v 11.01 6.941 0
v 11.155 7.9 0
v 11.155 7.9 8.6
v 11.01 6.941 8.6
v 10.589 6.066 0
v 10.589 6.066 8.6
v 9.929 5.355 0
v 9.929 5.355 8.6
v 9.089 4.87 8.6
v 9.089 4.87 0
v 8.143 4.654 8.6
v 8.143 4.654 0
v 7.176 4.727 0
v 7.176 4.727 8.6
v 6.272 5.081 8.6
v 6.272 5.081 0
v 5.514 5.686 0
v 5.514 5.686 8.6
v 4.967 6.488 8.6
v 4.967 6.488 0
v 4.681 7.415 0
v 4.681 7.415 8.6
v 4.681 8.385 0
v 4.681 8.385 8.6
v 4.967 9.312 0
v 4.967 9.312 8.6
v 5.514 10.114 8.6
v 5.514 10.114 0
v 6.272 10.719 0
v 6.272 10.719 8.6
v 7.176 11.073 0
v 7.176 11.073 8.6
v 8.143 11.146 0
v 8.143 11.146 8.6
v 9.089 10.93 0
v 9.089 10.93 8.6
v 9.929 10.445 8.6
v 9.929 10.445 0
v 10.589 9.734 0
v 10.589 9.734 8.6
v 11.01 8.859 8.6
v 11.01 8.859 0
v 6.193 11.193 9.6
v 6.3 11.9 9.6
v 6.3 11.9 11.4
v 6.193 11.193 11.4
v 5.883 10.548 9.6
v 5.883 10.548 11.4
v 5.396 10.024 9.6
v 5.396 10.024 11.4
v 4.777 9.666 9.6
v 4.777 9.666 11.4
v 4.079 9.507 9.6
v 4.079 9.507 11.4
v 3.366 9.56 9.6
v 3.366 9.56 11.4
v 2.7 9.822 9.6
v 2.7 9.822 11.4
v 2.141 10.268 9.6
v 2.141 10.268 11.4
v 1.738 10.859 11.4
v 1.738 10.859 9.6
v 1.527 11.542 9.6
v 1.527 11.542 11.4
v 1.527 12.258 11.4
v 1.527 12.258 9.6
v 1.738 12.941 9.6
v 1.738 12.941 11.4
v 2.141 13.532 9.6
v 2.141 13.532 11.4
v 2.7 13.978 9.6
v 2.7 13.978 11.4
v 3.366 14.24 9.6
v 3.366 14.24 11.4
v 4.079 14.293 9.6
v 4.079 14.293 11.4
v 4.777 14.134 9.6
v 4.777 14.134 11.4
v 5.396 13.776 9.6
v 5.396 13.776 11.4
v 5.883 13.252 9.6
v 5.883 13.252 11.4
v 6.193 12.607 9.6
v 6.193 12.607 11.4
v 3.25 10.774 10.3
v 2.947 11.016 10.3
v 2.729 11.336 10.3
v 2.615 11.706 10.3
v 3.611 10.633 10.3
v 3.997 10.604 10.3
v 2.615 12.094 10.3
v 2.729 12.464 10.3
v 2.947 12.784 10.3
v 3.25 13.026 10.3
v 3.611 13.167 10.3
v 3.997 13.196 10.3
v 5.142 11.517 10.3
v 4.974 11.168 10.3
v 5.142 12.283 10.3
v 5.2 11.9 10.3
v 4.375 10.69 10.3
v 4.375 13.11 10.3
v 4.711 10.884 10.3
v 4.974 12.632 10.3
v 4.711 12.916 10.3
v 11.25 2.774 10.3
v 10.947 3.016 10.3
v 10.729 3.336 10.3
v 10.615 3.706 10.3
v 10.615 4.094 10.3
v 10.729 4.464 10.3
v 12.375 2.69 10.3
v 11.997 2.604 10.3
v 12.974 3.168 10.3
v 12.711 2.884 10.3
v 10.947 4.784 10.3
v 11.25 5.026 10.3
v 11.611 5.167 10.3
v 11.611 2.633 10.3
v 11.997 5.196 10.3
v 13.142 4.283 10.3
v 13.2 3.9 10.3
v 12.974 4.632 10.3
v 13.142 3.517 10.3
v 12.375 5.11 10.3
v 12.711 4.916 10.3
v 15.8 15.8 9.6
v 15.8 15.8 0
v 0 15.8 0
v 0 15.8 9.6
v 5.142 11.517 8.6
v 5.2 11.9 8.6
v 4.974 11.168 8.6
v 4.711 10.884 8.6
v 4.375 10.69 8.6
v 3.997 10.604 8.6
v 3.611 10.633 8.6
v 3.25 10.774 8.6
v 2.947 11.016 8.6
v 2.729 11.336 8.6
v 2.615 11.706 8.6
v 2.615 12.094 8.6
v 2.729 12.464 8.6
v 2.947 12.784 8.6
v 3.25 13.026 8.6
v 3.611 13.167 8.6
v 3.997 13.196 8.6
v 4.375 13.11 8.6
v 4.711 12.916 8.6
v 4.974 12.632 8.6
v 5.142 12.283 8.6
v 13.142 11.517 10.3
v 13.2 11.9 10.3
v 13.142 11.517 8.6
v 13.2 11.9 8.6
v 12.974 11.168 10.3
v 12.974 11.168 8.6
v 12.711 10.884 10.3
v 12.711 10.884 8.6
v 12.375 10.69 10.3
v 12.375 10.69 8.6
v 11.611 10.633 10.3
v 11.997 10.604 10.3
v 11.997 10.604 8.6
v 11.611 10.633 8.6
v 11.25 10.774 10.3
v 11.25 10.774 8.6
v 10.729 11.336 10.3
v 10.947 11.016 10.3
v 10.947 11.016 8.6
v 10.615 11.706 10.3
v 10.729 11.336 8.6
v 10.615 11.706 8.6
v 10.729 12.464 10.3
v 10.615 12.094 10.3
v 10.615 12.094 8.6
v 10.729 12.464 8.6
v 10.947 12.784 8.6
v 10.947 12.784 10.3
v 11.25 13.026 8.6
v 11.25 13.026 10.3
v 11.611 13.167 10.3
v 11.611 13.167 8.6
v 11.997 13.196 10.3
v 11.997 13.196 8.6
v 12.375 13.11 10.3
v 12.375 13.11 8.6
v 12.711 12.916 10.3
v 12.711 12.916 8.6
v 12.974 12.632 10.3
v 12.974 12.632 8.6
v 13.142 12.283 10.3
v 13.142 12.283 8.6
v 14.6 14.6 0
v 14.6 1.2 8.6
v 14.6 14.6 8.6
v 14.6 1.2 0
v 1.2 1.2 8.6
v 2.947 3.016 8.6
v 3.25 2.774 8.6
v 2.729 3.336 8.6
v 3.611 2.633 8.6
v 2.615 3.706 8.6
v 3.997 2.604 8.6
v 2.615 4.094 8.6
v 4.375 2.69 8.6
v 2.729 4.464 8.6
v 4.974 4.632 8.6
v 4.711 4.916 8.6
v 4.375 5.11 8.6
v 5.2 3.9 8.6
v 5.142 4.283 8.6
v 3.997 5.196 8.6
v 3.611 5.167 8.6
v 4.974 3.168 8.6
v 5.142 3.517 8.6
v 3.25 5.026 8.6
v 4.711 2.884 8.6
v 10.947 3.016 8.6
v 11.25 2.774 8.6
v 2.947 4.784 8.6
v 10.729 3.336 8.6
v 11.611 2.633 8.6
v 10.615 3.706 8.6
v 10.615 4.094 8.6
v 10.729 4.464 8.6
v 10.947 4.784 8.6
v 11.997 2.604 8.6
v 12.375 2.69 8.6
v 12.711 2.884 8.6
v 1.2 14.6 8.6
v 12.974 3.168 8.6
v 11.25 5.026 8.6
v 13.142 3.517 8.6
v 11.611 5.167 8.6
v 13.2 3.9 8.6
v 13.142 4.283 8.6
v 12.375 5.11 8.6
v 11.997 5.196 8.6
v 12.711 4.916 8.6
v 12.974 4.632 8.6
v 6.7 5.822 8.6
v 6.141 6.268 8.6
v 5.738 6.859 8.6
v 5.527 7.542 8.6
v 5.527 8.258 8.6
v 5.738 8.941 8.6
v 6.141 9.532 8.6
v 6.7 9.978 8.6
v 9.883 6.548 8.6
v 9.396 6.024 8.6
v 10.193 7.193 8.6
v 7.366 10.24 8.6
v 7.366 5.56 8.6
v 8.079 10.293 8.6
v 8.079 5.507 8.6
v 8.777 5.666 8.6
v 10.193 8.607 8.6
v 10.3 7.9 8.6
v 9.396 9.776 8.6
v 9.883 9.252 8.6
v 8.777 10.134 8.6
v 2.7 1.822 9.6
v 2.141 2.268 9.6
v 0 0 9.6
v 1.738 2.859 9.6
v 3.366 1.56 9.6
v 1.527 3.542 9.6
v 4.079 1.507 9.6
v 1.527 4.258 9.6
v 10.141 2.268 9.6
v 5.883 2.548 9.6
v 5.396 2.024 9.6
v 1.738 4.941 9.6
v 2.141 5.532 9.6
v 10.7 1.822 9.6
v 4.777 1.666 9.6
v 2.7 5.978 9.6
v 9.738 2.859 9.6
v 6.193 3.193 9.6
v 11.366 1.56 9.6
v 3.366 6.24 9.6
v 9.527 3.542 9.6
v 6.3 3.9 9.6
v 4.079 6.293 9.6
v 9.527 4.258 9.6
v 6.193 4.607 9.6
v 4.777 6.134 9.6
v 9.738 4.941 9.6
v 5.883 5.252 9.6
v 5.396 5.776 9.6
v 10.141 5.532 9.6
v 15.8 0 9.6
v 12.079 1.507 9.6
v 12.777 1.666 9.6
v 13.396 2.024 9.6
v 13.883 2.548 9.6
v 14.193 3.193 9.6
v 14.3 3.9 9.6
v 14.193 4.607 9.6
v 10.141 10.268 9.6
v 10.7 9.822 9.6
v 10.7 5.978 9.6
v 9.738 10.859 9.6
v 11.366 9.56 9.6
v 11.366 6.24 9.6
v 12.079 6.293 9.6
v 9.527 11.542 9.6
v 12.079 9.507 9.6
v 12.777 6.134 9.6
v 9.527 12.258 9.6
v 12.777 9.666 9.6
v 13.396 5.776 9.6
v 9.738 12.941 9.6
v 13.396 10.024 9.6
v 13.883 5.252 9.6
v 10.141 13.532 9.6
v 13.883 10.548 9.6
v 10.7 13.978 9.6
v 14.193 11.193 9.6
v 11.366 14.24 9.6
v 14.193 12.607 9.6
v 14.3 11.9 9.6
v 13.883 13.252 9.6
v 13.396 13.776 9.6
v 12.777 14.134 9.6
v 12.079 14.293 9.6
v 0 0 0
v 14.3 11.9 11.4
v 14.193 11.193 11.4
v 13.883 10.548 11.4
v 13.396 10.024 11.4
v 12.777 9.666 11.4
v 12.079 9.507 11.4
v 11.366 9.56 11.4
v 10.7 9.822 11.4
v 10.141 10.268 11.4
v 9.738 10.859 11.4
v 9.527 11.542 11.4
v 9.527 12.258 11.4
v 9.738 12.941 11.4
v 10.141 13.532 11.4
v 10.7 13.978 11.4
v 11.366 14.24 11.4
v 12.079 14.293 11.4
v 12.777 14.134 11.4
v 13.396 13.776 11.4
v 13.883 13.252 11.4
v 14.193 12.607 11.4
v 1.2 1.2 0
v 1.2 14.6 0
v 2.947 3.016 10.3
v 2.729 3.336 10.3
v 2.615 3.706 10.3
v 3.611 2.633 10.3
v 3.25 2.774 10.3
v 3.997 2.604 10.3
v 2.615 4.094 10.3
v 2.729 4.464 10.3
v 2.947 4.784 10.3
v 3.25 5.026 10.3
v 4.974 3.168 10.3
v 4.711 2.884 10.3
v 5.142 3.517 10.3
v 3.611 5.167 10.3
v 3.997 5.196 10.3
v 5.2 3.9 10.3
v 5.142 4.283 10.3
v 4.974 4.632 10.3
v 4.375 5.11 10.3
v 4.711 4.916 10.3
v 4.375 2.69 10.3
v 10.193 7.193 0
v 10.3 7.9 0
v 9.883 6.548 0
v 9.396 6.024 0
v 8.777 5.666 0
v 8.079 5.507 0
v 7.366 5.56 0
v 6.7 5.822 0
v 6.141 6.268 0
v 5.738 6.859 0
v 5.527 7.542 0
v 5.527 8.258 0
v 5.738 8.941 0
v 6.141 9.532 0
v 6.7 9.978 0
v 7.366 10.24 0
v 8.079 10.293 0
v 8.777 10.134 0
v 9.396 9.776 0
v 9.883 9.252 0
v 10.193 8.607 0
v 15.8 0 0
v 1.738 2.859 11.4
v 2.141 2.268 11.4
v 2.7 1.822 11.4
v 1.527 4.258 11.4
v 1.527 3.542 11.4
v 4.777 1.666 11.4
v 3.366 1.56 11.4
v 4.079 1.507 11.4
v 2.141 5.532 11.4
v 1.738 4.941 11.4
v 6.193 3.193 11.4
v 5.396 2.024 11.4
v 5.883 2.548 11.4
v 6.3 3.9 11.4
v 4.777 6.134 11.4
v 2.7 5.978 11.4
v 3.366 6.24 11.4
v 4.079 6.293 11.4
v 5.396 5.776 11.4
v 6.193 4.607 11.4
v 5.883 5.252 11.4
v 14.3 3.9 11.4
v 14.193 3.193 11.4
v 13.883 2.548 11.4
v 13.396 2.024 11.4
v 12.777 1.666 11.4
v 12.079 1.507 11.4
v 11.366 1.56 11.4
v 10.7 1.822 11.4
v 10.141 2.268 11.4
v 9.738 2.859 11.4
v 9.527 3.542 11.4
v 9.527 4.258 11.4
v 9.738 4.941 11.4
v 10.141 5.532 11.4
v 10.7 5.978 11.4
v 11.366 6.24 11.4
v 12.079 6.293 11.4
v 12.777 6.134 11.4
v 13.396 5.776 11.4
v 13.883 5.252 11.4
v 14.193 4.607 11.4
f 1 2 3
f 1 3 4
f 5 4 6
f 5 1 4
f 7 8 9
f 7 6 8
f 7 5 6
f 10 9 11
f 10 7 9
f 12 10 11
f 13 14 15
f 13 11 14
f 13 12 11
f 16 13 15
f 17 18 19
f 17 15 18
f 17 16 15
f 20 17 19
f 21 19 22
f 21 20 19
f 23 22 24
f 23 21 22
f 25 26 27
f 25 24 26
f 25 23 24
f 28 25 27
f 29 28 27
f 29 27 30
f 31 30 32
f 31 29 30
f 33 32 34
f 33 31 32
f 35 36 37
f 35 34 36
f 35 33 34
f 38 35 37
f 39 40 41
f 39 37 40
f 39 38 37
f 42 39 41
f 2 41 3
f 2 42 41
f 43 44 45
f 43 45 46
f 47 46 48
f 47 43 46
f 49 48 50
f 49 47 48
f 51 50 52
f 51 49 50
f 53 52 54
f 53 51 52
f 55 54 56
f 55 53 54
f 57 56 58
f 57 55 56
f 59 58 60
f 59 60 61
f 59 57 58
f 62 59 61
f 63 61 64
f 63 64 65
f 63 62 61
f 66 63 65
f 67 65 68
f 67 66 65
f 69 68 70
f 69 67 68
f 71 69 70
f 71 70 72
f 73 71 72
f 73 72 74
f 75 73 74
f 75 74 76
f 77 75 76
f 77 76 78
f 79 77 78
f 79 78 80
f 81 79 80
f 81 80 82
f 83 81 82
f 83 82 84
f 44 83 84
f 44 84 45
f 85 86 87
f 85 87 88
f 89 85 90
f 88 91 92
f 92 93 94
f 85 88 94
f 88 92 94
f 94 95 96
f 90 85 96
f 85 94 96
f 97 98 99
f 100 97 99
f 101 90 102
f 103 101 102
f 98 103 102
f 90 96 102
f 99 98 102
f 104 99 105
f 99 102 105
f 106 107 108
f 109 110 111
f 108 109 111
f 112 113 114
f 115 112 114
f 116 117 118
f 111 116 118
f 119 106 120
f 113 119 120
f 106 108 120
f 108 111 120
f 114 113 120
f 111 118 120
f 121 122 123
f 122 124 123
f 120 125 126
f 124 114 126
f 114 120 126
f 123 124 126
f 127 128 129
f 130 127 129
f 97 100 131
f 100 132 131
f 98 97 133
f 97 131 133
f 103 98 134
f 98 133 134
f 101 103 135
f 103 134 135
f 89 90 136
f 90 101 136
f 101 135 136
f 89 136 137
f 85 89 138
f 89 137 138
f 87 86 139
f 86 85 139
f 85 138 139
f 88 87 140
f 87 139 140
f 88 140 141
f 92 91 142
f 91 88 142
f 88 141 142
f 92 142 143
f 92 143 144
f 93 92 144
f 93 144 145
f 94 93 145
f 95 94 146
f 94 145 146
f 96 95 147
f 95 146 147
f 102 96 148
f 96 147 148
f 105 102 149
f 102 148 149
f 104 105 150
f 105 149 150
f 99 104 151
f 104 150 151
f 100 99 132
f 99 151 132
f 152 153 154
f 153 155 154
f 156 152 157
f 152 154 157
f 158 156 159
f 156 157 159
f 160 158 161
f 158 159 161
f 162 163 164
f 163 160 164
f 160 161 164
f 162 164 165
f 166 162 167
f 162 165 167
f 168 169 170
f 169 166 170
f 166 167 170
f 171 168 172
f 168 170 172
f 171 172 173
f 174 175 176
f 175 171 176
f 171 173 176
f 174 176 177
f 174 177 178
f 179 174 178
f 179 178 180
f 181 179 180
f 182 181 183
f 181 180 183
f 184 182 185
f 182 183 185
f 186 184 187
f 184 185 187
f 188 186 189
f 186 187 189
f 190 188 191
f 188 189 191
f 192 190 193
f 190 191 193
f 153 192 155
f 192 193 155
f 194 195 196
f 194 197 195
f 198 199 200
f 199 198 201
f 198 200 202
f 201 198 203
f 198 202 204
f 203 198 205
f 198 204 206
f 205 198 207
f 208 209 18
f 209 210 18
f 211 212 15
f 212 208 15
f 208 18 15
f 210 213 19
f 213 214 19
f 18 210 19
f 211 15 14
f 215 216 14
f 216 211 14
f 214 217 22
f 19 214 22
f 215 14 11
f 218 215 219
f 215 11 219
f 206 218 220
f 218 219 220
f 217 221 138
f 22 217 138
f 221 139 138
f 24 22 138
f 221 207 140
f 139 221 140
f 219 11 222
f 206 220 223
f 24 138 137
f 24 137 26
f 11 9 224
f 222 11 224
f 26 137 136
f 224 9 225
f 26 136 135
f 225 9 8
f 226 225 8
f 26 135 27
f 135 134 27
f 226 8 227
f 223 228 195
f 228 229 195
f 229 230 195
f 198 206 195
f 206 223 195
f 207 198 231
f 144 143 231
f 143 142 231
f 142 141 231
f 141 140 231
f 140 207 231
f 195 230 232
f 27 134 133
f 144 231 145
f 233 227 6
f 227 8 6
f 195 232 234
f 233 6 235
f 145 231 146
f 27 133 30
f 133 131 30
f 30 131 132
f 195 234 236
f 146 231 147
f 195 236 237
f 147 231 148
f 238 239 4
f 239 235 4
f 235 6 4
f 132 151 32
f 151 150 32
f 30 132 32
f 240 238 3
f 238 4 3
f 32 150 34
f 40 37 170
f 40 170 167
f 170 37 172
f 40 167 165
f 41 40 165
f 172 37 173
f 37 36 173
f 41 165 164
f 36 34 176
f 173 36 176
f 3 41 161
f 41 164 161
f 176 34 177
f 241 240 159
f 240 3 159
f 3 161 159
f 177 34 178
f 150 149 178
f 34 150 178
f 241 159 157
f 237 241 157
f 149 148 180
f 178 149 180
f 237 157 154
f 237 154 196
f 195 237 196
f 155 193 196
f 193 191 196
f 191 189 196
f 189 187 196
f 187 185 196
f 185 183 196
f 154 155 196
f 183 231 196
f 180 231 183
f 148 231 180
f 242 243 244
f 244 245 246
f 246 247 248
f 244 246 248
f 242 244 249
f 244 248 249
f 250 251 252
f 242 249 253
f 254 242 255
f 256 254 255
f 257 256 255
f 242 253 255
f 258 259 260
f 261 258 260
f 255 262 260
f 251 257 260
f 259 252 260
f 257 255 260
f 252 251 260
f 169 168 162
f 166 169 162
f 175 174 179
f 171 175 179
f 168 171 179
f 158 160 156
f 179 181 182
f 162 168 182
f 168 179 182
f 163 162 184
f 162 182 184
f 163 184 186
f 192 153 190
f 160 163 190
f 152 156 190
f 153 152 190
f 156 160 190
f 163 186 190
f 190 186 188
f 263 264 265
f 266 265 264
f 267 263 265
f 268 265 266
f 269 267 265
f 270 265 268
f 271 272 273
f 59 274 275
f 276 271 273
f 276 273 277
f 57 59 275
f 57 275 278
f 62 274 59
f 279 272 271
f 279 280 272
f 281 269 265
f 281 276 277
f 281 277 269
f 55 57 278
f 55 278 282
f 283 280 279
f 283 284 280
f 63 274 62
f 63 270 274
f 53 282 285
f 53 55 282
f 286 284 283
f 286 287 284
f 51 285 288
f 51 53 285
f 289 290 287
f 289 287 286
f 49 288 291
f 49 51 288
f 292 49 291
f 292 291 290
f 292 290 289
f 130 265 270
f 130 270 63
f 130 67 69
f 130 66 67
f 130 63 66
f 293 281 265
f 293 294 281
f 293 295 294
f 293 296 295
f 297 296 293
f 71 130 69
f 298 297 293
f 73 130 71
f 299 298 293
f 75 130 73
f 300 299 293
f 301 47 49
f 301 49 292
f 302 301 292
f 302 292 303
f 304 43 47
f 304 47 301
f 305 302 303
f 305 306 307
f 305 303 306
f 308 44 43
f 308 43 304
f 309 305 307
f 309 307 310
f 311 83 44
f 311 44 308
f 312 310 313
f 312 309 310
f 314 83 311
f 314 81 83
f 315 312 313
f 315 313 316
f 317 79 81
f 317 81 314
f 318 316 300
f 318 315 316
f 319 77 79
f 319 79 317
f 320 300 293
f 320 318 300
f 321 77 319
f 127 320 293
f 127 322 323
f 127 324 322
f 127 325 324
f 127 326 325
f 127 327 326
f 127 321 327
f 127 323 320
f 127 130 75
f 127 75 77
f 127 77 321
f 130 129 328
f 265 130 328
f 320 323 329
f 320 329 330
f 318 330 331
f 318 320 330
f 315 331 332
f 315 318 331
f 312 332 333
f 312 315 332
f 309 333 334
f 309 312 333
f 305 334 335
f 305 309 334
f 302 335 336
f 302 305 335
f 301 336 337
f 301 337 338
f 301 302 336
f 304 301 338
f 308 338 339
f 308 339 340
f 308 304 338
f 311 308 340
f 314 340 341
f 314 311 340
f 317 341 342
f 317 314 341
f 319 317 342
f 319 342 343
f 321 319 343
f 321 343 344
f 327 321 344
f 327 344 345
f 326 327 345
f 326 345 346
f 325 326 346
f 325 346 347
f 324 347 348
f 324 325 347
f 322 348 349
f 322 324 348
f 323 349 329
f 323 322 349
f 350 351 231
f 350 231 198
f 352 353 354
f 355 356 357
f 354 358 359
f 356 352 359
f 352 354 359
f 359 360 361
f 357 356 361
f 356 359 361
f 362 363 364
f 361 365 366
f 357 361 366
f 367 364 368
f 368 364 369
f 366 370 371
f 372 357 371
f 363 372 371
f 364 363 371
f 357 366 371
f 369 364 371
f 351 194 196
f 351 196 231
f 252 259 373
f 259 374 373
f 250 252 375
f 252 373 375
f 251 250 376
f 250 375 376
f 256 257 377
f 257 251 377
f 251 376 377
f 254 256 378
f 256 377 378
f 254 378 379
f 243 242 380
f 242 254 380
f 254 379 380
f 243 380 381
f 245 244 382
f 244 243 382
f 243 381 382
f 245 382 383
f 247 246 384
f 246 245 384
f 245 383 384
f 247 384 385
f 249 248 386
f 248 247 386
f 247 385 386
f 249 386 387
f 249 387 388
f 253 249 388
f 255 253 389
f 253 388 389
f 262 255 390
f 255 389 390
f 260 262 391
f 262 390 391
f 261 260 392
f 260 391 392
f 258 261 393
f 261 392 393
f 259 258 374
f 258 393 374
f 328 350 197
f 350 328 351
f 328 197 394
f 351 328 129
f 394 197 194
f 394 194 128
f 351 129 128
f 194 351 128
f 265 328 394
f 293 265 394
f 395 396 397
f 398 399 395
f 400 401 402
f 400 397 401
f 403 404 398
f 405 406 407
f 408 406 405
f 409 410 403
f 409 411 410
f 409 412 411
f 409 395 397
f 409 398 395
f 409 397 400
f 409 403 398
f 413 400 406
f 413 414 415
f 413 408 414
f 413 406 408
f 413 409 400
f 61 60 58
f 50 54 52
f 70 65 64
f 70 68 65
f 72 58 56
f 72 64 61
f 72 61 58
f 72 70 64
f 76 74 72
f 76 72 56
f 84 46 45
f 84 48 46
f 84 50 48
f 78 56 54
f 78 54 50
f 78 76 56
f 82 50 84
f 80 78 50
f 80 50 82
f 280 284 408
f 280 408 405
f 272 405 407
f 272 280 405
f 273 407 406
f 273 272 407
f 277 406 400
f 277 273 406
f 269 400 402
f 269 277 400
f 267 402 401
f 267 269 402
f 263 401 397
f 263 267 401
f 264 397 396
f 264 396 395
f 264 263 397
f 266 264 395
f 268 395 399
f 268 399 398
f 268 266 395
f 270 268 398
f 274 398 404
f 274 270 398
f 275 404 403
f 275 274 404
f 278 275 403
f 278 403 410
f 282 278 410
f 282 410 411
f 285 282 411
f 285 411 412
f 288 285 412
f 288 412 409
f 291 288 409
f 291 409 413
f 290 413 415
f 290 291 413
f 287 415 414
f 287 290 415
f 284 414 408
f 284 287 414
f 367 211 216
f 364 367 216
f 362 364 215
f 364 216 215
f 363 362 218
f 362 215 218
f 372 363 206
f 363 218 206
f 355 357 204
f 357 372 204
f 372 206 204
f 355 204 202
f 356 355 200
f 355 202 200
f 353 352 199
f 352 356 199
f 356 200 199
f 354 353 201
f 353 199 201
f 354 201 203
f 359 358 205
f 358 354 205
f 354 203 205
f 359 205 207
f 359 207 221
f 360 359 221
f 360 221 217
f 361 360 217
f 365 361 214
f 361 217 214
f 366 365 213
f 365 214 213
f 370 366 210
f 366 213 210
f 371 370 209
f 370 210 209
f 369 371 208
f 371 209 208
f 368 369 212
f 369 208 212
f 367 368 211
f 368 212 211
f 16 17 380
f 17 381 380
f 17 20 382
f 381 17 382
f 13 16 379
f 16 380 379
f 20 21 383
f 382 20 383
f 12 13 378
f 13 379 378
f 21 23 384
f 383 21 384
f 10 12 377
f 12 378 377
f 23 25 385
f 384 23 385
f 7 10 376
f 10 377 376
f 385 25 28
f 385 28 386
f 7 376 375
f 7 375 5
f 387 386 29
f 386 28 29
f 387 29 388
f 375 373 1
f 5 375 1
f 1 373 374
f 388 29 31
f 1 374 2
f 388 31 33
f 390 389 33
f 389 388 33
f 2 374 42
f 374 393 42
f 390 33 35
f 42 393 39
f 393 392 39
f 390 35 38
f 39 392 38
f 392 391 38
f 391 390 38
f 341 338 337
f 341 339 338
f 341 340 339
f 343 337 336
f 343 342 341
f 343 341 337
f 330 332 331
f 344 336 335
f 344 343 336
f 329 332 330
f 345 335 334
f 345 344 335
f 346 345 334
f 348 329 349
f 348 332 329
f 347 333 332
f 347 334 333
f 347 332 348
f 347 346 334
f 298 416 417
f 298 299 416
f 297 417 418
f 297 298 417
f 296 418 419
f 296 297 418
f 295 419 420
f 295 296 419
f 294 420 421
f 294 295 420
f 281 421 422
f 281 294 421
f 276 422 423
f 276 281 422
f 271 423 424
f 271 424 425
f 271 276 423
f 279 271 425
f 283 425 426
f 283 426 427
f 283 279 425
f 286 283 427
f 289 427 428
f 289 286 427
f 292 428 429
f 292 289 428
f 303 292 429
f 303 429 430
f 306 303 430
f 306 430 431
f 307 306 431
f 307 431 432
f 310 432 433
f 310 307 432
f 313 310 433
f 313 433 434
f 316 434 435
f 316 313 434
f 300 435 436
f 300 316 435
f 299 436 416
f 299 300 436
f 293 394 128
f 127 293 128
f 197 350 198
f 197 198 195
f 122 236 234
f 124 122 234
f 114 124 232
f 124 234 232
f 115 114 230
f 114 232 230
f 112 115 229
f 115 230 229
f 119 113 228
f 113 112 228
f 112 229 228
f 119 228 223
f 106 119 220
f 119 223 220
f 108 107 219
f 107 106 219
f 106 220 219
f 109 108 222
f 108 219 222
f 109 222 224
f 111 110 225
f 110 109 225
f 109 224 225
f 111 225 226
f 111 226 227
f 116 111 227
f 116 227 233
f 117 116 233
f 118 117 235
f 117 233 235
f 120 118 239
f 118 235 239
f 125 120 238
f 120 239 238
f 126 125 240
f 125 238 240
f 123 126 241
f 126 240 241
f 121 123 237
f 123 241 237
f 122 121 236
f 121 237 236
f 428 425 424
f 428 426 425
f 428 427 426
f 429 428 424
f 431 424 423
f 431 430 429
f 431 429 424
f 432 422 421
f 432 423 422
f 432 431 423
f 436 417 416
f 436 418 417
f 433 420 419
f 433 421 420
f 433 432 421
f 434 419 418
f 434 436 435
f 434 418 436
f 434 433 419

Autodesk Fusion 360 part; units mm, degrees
sketch "Sketch1" plane through (0, 0, 0) normal (0, 0, 1) x (1, 0, 0)
  line L0 (0, 0) -> (15.8, 0)
  line L1 (15.8, 0) -> (15.8, 15.8)
  line L2 (15.8, 15.8) -> (0, 15.8)
  line L3 (0, 15.8) -> (0, 0)
  circle A0 centre (3.9, 11.9) radius 2.4
  circle A1 centre (11.9, 11.9) radius 2.4
  circle A2 centre (11.9, 3.9) radius 2.4
  circle A3 centre (3.9, 3.9) radius 2.4
  line L4 (1.2, 1.2) -> (14.6, 1.2)
  line L5 (14.6, 1.2) -> (14.6, 14.6)
  line L6 (14.6, 14.6) -> (1.2, 14.6)
  line L7 (1.2, 14.6) -> (1.2, 1.2)
  circle A4 centre (7.9, 7.9) radius 3.255
  circle A5 centre (7.9, 7.9) radius 2.4
  circle A6 centre (3.9, 11.9) radius 1.3
  circle A7 centre (11.9, 11.9) radius 1.3
  circle A8 centre (11.9, 3.9) radius 1.3
  circle A9 centre (3.9, 3.9) radius 1.3
  dimension "d1" = 15.8
  dimension "d2" = 15.8
  dimension "d3" = 4.8
  dimension "d4" = 4.8
  dimension "d5" = 4.8
  dimension "d6" = 4.8
  dimension "d7" = 8
  dimension "d8" = 8
  dimension "d9" = 8
  dimension "d10" = 8
  dimension "d11" = 3.9
  dimension "d12" = 3.9
  dimension "d13" = 3.9
  dimension "d14" = 13.4
  dimension "d15" = 13.4
  dimension "d16" = 1.2
  dimension "d17" = 1.2
  dimension "d18" = 6.51
  dimension "d19" = 6.7
  dimension "d20" = 6.7
  dimension "d21" = 4.8
  dimension "d22" = 2.6
  dimension "d23" = 2.6
  dimension "d24" = 2.6
  dimension "d25" = 2.6
  dimension "d32" = 3.9
extrude "Extrude1" add sketch "Sketch1" along normal blind 9.6 contours L0 L1 L2 L3 | A4 makes body 1 at (0, 10.5333, 3.2) makes body 2 at (11.1388, 8.2241, 6.4)
extrude "Extrude2" add sketch "Sketch1" along normal blind 9.6 and the other way blind -8.6 contours A0 | A1 | A2 | A3 | L4 L5 L6 L7 | A5 bodies 1 2
extrude "Extrude3" add sketch "Sketch1" along normal blind 11.4 and the other way blind -9.6 contours A0 | A1 | A2 | A3 | A6 | A7 | A8 | A9 bodies 1
extrude "Extrude4" cut sketch "Sketch1" along normal blind 10.3 contours A6 | A7 | A8 | A9 bodies 1
copy_body "Body->Comp1" bodies 1 removing the originals makes body 3 in component "Yellow 2x2"
component "Yellow 2x2" placed x (1, 0, 0) y (0, 1, 0) z (0, 0, 1) at (0, 0, 0)
equation "d14 = 15.8 mm - 1.2 mm - 1.2 mm"
equation "d15 = 15.8 mm - 1.2 mm - 1.2 mm"
equation "d19 = ( 13.4 / 2 ) * 1 mm"
equation "d33 = 9.6 mm + 1.8 mm"
equation "d37 = 9.6 mm + 0.7 mm"
